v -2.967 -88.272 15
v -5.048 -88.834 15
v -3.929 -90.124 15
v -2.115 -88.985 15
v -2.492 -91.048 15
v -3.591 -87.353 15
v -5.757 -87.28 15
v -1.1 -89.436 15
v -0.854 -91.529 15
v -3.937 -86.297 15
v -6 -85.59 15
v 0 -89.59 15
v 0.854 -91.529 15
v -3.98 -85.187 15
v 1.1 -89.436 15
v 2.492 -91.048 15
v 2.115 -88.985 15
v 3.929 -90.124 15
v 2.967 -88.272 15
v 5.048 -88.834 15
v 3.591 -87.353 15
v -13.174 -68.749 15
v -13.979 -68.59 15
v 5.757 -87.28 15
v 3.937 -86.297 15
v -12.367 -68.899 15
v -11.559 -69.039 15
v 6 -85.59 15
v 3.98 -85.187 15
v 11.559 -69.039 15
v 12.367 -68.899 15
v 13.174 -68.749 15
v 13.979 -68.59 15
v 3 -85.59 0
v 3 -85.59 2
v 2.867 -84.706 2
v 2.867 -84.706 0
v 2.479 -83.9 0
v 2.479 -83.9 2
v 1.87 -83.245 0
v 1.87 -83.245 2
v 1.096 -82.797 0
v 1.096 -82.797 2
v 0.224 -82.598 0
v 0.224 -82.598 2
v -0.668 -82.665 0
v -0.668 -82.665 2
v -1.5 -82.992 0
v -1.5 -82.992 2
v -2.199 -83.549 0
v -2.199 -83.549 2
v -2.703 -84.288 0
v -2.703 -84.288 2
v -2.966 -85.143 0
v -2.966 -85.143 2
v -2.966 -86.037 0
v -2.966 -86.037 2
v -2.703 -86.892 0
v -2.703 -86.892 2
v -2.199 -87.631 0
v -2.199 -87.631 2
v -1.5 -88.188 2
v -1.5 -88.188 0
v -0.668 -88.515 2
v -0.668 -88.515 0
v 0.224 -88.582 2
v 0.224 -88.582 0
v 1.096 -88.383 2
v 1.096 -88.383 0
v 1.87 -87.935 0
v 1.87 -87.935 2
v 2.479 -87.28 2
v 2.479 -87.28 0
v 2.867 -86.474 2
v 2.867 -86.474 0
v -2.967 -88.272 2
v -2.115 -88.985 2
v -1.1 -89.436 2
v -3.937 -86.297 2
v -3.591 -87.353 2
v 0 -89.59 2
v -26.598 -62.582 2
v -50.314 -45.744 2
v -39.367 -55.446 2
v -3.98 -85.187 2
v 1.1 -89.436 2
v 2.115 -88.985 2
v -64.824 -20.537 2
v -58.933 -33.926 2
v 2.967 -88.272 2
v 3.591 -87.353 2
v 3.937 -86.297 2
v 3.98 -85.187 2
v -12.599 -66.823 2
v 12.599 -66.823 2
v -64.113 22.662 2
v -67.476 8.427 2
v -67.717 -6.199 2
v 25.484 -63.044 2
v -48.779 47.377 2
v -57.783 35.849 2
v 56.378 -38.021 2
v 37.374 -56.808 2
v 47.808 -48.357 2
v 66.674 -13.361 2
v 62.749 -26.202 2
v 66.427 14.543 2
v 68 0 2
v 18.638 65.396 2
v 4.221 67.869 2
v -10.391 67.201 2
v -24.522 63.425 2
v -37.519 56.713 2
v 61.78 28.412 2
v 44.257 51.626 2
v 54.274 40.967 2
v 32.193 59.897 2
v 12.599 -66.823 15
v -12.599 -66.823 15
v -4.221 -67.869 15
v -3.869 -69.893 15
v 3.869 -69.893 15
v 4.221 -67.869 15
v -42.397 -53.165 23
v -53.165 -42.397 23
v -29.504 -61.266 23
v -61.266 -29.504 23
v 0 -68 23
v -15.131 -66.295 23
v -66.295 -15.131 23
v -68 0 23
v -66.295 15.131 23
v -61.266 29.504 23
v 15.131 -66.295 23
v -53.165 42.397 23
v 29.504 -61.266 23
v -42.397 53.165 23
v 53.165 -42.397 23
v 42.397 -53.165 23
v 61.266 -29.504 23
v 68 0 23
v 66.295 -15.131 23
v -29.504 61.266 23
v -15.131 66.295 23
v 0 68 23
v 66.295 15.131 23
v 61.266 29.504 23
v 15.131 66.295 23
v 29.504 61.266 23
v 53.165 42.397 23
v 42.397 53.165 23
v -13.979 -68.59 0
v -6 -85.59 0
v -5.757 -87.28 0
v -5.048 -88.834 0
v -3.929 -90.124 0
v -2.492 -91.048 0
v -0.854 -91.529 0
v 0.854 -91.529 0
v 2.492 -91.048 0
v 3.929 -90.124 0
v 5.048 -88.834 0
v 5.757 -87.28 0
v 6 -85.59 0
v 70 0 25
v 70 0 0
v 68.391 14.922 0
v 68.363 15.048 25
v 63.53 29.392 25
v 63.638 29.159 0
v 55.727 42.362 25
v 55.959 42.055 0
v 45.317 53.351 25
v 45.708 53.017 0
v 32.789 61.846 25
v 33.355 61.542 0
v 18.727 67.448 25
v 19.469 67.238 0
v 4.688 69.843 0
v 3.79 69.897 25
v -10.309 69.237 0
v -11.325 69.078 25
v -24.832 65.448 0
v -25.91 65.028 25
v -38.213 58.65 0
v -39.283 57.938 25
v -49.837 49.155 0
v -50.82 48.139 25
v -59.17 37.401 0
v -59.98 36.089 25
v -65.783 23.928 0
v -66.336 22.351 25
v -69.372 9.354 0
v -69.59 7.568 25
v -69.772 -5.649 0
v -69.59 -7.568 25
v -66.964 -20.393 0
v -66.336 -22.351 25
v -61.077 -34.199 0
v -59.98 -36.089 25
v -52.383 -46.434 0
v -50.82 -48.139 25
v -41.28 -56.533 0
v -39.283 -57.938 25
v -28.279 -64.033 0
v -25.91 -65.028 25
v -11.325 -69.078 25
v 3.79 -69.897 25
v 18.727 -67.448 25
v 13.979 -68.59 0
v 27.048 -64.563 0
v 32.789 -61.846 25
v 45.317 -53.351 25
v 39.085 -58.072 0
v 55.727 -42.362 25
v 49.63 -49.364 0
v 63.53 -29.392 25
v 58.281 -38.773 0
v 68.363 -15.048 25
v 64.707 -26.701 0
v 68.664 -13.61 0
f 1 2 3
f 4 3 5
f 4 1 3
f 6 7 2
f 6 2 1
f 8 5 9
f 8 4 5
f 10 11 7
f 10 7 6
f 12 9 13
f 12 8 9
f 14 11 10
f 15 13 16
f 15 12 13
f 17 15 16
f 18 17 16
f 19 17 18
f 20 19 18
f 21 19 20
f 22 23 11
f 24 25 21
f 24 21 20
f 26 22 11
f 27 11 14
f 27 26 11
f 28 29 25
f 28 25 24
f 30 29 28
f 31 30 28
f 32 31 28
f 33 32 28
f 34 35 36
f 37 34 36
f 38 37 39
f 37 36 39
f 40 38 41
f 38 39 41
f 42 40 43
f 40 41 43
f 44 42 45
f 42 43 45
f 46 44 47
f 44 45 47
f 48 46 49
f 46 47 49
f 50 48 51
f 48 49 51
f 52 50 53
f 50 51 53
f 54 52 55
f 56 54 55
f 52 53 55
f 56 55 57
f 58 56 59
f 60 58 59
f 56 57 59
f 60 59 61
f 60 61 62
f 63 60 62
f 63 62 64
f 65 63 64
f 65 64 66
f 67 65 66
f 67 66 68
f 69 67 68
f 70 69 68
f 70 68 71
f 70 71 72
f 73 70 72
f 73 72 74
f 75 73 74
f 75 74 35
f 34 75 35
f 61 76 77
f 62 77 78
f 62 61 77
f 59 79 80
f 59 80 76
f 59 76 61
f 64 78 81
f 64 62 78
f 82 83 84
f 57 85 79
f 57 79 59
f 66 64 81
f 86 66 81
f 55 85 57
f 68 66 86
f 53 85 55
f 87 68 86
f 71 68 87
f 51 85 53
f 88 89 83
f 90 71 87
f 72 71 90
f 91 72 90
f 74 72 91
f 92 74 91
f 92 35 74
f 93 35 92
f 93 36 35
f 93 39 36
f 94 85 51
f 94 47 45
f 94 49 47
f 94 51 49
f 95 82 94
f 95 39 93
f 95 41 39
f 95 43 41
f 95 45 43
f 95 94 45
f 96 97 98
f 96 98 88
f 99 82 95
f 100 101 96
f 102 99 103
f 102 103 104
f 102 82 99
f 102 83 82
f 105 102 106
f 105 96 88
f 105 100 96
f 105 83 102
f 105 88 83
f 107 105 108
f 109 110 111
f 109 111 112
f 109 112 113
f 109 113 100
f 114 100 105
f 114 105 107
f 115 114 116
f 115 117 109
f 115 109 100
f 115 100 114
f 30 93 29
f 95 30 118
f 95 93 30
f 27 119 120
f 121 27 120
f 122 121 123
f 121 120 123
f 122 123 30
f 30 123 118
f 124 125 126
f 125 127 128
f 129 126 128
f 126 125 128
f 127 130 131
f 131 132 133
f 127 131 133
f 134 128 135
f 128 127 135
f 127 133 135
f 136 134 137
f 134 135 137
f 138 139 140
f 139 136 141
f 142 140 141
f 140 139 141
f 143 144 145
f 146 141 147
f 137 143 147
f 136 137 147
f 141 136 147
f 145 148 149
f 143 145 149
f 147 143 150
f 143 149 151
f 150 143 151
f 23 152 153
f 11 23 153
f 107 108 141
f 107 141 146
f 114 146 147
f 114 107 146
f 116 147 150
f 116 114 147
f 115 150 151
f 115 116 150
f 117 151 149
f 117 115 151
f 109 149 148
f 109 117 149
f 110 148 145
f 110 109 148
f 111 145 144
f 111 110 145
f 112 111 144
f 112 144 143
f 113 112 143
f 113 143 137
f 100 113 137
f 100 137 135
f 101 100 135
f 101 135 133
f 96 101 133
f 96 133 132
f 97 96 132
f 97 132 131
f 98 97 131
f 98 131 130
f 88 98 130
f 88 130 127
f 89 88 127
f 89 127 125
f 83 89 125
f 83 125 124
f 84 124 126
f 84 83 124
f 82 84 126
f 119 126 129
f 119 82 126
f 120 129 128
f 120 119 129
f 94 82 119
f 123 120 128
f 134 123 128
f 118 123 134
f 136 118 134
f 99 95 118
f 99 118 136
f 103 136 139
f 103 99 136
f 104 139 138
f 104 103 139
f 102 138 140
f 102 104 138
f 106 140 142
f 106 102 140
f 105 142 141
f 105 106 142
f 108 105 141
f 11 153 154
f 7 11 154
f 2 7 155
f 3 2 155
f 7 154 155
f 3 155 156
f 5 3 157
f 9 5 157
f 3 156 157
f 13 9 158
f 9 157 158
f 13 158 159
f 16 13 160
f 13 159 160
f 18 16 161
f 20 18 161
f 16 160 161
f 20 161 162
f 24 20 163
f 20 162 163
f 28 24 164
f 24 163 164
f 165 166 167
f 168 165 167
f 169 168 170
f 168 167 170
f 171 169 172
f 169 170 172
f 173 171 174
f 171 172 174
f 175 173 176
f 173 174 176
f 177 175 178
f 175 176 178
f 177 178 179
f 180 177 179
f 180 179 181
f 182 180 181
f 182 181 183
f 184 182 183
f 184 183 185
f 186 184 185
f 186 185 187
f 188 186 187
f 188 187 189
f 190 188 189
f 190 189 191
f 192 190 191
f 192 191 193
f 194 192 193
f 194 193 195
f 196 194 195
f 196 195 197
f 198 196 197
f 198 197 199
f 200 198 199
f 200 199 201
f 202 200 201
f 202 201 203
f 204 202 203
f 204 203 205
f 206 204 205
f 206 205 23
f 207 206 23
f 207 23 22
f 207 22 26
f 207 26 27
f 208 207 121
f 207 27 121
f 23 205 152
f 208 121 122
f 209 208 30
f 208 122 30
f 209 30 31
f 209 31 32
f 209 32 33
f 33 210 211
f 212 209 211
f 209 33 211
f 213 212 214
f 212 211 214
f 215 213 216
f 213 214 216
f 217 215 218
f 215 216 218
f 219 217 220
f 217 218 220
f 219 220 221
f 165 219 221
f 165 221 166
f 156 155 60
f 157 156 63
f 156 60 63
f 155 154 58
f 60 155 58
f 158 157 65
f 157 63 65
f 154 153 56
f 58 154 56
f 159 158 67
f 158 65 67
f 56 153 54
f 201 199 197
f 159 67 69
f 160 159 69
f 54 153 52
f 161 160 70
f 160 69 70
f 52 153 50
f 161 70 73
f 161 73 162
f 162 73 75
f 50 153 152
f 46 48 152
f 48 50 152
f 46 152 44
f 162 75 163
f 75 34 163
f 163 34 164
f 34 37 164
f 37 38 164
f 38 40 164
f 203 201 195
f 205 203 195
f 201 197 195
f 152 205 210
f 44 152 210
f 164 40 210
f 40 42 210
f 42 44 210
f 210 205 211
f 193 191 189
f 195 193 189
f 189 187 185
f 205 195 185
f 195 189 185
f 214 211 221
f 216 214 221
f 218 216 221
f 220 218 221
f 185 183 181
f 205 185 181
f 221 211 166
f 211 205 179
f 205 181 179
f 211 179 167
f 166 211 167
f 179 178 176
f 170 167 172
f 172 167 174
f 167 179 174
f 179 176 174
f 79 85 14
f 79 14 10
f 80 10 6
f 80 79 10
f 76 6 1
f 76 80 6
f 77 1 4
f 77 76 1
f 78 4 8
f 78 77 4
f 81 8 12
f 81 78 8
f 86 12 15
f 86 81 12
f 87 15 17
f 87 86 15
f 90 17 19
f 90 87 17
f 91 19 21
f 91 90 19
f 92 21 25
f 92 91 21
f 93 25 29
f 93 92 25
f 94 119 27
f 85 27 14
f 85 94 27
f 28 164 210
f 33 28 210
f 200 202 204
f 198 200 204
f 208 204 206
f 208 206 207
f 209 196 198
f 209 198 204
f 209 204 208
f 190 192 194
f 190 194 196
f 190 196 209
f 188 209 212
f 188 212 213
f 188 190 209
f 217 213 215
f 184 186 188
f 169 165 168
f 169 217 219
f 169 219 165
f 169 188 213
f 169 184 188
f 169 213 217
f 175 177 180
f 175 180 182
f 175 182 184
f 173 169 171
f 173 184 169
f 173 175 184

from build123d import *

# Parameters (mm, degrees)
SKETCH1_R           = 70
BOSS_EXTRUDE1_DEPTH = 25
SKETCH21_R          = 6
BOSS_EXTRUDE4_DEPTH = 15
CUT_EXTRUDE2_REACH  = 118.249
SKETCH22_R          = 3
SHELL15_START       = 2
SHELL15_OUTLINE_R   = 68
SHELL15_DEPTH       = 21
SHELL15_2_OUTLINE_R = 3
SHELL15_2_DEPTH     = 13


# Read off the part's stored shape, not the designer's step: Shell15
with BuildPart() as part:
    # Sketch1 → Boss-Extrude1 (new body)
    with BuildSketch(Plane.XY):
        Circle(SKETCH1_R)
    extrude(amount=BOSS_EXTRUDE1_DEPTH)

    # Sketch21 → Boss-Extrude4 (add)
    with BuildSketch(Plane.XY):
        with Locations((0, -85.59)):
            Circle(SKETCH21_R)
        with BuildLine():
            Line((-13.97898065, -68.59), (-6, -85.59))
            ThreePointArc((-6, -85.59), (0, -79.59), (6, -85.59))
            Line((6, -85.59), (13.97898065, -68.59))
            ThreePointArc((13.97898065, -68.59), (0, -70), (-13.97898065, -68.59))
        make_face()
    extrude(amount=BOSS_EXTRUDE4_DEPTH)

    # Sketch22 → Cut-Extrude2 (cut, up to next)
    with BuildSketch(Plane.XY.offset(15), mode=Mode.PRIVATE) as cut_extrude2_sk1:
        with Locations((0, -85.59)):
            Circle(SKETCH22_R)
    cut_extrude2_tool1 = extrude(cut_extrude2_sk1.sketch, amount=-CUT_EXTRUDE2_REACH, mode=Mode.PRIVATE) & part.part
    add(cut_extrude2_tool1.solids().sort_by_distance((0, -85.59, 15))[0], mode=Mode.SUBTRACT)

    # Shell15 outline → Shell15 (cut)
    with BuildSketch(Plane.XY.offset(SHELL15_START)):
        Circle(SHELL15_OUTLINE_R)
    extrude(amount=SHELL15_DEPTH, mode=Mode.SUBTRACT)

    # Shell15 2 outline → Shell15 2 (cut)
    with BuildSketch(Plane.XY.offset(SHELL15_START)):
        with BuildLine():
            ThreePointArc((12.599173957, -66.82260707), (0, -68), (-12.599173957, -66.82260707))
            Line((-12.599173957, -66.82260707), (-3.979676533, -85.187290811))
            ThreePointArc((-3.979676533, -85.187290811), (0, -89.59), (3.979676533, -85.187290811))
            Line((3.979676533, -85.187290811), (12.599173957, -66.82260707))
        make_face()
        with Locations((0, -85.59)):
            Circle(SHELL15_2_OUTLINE_R, mode=Mode.SUBTRACT)
    extrude(amount=SHELL15_2_DEPTH, mode=Mode.SUBTRACT)


solid = part.part
